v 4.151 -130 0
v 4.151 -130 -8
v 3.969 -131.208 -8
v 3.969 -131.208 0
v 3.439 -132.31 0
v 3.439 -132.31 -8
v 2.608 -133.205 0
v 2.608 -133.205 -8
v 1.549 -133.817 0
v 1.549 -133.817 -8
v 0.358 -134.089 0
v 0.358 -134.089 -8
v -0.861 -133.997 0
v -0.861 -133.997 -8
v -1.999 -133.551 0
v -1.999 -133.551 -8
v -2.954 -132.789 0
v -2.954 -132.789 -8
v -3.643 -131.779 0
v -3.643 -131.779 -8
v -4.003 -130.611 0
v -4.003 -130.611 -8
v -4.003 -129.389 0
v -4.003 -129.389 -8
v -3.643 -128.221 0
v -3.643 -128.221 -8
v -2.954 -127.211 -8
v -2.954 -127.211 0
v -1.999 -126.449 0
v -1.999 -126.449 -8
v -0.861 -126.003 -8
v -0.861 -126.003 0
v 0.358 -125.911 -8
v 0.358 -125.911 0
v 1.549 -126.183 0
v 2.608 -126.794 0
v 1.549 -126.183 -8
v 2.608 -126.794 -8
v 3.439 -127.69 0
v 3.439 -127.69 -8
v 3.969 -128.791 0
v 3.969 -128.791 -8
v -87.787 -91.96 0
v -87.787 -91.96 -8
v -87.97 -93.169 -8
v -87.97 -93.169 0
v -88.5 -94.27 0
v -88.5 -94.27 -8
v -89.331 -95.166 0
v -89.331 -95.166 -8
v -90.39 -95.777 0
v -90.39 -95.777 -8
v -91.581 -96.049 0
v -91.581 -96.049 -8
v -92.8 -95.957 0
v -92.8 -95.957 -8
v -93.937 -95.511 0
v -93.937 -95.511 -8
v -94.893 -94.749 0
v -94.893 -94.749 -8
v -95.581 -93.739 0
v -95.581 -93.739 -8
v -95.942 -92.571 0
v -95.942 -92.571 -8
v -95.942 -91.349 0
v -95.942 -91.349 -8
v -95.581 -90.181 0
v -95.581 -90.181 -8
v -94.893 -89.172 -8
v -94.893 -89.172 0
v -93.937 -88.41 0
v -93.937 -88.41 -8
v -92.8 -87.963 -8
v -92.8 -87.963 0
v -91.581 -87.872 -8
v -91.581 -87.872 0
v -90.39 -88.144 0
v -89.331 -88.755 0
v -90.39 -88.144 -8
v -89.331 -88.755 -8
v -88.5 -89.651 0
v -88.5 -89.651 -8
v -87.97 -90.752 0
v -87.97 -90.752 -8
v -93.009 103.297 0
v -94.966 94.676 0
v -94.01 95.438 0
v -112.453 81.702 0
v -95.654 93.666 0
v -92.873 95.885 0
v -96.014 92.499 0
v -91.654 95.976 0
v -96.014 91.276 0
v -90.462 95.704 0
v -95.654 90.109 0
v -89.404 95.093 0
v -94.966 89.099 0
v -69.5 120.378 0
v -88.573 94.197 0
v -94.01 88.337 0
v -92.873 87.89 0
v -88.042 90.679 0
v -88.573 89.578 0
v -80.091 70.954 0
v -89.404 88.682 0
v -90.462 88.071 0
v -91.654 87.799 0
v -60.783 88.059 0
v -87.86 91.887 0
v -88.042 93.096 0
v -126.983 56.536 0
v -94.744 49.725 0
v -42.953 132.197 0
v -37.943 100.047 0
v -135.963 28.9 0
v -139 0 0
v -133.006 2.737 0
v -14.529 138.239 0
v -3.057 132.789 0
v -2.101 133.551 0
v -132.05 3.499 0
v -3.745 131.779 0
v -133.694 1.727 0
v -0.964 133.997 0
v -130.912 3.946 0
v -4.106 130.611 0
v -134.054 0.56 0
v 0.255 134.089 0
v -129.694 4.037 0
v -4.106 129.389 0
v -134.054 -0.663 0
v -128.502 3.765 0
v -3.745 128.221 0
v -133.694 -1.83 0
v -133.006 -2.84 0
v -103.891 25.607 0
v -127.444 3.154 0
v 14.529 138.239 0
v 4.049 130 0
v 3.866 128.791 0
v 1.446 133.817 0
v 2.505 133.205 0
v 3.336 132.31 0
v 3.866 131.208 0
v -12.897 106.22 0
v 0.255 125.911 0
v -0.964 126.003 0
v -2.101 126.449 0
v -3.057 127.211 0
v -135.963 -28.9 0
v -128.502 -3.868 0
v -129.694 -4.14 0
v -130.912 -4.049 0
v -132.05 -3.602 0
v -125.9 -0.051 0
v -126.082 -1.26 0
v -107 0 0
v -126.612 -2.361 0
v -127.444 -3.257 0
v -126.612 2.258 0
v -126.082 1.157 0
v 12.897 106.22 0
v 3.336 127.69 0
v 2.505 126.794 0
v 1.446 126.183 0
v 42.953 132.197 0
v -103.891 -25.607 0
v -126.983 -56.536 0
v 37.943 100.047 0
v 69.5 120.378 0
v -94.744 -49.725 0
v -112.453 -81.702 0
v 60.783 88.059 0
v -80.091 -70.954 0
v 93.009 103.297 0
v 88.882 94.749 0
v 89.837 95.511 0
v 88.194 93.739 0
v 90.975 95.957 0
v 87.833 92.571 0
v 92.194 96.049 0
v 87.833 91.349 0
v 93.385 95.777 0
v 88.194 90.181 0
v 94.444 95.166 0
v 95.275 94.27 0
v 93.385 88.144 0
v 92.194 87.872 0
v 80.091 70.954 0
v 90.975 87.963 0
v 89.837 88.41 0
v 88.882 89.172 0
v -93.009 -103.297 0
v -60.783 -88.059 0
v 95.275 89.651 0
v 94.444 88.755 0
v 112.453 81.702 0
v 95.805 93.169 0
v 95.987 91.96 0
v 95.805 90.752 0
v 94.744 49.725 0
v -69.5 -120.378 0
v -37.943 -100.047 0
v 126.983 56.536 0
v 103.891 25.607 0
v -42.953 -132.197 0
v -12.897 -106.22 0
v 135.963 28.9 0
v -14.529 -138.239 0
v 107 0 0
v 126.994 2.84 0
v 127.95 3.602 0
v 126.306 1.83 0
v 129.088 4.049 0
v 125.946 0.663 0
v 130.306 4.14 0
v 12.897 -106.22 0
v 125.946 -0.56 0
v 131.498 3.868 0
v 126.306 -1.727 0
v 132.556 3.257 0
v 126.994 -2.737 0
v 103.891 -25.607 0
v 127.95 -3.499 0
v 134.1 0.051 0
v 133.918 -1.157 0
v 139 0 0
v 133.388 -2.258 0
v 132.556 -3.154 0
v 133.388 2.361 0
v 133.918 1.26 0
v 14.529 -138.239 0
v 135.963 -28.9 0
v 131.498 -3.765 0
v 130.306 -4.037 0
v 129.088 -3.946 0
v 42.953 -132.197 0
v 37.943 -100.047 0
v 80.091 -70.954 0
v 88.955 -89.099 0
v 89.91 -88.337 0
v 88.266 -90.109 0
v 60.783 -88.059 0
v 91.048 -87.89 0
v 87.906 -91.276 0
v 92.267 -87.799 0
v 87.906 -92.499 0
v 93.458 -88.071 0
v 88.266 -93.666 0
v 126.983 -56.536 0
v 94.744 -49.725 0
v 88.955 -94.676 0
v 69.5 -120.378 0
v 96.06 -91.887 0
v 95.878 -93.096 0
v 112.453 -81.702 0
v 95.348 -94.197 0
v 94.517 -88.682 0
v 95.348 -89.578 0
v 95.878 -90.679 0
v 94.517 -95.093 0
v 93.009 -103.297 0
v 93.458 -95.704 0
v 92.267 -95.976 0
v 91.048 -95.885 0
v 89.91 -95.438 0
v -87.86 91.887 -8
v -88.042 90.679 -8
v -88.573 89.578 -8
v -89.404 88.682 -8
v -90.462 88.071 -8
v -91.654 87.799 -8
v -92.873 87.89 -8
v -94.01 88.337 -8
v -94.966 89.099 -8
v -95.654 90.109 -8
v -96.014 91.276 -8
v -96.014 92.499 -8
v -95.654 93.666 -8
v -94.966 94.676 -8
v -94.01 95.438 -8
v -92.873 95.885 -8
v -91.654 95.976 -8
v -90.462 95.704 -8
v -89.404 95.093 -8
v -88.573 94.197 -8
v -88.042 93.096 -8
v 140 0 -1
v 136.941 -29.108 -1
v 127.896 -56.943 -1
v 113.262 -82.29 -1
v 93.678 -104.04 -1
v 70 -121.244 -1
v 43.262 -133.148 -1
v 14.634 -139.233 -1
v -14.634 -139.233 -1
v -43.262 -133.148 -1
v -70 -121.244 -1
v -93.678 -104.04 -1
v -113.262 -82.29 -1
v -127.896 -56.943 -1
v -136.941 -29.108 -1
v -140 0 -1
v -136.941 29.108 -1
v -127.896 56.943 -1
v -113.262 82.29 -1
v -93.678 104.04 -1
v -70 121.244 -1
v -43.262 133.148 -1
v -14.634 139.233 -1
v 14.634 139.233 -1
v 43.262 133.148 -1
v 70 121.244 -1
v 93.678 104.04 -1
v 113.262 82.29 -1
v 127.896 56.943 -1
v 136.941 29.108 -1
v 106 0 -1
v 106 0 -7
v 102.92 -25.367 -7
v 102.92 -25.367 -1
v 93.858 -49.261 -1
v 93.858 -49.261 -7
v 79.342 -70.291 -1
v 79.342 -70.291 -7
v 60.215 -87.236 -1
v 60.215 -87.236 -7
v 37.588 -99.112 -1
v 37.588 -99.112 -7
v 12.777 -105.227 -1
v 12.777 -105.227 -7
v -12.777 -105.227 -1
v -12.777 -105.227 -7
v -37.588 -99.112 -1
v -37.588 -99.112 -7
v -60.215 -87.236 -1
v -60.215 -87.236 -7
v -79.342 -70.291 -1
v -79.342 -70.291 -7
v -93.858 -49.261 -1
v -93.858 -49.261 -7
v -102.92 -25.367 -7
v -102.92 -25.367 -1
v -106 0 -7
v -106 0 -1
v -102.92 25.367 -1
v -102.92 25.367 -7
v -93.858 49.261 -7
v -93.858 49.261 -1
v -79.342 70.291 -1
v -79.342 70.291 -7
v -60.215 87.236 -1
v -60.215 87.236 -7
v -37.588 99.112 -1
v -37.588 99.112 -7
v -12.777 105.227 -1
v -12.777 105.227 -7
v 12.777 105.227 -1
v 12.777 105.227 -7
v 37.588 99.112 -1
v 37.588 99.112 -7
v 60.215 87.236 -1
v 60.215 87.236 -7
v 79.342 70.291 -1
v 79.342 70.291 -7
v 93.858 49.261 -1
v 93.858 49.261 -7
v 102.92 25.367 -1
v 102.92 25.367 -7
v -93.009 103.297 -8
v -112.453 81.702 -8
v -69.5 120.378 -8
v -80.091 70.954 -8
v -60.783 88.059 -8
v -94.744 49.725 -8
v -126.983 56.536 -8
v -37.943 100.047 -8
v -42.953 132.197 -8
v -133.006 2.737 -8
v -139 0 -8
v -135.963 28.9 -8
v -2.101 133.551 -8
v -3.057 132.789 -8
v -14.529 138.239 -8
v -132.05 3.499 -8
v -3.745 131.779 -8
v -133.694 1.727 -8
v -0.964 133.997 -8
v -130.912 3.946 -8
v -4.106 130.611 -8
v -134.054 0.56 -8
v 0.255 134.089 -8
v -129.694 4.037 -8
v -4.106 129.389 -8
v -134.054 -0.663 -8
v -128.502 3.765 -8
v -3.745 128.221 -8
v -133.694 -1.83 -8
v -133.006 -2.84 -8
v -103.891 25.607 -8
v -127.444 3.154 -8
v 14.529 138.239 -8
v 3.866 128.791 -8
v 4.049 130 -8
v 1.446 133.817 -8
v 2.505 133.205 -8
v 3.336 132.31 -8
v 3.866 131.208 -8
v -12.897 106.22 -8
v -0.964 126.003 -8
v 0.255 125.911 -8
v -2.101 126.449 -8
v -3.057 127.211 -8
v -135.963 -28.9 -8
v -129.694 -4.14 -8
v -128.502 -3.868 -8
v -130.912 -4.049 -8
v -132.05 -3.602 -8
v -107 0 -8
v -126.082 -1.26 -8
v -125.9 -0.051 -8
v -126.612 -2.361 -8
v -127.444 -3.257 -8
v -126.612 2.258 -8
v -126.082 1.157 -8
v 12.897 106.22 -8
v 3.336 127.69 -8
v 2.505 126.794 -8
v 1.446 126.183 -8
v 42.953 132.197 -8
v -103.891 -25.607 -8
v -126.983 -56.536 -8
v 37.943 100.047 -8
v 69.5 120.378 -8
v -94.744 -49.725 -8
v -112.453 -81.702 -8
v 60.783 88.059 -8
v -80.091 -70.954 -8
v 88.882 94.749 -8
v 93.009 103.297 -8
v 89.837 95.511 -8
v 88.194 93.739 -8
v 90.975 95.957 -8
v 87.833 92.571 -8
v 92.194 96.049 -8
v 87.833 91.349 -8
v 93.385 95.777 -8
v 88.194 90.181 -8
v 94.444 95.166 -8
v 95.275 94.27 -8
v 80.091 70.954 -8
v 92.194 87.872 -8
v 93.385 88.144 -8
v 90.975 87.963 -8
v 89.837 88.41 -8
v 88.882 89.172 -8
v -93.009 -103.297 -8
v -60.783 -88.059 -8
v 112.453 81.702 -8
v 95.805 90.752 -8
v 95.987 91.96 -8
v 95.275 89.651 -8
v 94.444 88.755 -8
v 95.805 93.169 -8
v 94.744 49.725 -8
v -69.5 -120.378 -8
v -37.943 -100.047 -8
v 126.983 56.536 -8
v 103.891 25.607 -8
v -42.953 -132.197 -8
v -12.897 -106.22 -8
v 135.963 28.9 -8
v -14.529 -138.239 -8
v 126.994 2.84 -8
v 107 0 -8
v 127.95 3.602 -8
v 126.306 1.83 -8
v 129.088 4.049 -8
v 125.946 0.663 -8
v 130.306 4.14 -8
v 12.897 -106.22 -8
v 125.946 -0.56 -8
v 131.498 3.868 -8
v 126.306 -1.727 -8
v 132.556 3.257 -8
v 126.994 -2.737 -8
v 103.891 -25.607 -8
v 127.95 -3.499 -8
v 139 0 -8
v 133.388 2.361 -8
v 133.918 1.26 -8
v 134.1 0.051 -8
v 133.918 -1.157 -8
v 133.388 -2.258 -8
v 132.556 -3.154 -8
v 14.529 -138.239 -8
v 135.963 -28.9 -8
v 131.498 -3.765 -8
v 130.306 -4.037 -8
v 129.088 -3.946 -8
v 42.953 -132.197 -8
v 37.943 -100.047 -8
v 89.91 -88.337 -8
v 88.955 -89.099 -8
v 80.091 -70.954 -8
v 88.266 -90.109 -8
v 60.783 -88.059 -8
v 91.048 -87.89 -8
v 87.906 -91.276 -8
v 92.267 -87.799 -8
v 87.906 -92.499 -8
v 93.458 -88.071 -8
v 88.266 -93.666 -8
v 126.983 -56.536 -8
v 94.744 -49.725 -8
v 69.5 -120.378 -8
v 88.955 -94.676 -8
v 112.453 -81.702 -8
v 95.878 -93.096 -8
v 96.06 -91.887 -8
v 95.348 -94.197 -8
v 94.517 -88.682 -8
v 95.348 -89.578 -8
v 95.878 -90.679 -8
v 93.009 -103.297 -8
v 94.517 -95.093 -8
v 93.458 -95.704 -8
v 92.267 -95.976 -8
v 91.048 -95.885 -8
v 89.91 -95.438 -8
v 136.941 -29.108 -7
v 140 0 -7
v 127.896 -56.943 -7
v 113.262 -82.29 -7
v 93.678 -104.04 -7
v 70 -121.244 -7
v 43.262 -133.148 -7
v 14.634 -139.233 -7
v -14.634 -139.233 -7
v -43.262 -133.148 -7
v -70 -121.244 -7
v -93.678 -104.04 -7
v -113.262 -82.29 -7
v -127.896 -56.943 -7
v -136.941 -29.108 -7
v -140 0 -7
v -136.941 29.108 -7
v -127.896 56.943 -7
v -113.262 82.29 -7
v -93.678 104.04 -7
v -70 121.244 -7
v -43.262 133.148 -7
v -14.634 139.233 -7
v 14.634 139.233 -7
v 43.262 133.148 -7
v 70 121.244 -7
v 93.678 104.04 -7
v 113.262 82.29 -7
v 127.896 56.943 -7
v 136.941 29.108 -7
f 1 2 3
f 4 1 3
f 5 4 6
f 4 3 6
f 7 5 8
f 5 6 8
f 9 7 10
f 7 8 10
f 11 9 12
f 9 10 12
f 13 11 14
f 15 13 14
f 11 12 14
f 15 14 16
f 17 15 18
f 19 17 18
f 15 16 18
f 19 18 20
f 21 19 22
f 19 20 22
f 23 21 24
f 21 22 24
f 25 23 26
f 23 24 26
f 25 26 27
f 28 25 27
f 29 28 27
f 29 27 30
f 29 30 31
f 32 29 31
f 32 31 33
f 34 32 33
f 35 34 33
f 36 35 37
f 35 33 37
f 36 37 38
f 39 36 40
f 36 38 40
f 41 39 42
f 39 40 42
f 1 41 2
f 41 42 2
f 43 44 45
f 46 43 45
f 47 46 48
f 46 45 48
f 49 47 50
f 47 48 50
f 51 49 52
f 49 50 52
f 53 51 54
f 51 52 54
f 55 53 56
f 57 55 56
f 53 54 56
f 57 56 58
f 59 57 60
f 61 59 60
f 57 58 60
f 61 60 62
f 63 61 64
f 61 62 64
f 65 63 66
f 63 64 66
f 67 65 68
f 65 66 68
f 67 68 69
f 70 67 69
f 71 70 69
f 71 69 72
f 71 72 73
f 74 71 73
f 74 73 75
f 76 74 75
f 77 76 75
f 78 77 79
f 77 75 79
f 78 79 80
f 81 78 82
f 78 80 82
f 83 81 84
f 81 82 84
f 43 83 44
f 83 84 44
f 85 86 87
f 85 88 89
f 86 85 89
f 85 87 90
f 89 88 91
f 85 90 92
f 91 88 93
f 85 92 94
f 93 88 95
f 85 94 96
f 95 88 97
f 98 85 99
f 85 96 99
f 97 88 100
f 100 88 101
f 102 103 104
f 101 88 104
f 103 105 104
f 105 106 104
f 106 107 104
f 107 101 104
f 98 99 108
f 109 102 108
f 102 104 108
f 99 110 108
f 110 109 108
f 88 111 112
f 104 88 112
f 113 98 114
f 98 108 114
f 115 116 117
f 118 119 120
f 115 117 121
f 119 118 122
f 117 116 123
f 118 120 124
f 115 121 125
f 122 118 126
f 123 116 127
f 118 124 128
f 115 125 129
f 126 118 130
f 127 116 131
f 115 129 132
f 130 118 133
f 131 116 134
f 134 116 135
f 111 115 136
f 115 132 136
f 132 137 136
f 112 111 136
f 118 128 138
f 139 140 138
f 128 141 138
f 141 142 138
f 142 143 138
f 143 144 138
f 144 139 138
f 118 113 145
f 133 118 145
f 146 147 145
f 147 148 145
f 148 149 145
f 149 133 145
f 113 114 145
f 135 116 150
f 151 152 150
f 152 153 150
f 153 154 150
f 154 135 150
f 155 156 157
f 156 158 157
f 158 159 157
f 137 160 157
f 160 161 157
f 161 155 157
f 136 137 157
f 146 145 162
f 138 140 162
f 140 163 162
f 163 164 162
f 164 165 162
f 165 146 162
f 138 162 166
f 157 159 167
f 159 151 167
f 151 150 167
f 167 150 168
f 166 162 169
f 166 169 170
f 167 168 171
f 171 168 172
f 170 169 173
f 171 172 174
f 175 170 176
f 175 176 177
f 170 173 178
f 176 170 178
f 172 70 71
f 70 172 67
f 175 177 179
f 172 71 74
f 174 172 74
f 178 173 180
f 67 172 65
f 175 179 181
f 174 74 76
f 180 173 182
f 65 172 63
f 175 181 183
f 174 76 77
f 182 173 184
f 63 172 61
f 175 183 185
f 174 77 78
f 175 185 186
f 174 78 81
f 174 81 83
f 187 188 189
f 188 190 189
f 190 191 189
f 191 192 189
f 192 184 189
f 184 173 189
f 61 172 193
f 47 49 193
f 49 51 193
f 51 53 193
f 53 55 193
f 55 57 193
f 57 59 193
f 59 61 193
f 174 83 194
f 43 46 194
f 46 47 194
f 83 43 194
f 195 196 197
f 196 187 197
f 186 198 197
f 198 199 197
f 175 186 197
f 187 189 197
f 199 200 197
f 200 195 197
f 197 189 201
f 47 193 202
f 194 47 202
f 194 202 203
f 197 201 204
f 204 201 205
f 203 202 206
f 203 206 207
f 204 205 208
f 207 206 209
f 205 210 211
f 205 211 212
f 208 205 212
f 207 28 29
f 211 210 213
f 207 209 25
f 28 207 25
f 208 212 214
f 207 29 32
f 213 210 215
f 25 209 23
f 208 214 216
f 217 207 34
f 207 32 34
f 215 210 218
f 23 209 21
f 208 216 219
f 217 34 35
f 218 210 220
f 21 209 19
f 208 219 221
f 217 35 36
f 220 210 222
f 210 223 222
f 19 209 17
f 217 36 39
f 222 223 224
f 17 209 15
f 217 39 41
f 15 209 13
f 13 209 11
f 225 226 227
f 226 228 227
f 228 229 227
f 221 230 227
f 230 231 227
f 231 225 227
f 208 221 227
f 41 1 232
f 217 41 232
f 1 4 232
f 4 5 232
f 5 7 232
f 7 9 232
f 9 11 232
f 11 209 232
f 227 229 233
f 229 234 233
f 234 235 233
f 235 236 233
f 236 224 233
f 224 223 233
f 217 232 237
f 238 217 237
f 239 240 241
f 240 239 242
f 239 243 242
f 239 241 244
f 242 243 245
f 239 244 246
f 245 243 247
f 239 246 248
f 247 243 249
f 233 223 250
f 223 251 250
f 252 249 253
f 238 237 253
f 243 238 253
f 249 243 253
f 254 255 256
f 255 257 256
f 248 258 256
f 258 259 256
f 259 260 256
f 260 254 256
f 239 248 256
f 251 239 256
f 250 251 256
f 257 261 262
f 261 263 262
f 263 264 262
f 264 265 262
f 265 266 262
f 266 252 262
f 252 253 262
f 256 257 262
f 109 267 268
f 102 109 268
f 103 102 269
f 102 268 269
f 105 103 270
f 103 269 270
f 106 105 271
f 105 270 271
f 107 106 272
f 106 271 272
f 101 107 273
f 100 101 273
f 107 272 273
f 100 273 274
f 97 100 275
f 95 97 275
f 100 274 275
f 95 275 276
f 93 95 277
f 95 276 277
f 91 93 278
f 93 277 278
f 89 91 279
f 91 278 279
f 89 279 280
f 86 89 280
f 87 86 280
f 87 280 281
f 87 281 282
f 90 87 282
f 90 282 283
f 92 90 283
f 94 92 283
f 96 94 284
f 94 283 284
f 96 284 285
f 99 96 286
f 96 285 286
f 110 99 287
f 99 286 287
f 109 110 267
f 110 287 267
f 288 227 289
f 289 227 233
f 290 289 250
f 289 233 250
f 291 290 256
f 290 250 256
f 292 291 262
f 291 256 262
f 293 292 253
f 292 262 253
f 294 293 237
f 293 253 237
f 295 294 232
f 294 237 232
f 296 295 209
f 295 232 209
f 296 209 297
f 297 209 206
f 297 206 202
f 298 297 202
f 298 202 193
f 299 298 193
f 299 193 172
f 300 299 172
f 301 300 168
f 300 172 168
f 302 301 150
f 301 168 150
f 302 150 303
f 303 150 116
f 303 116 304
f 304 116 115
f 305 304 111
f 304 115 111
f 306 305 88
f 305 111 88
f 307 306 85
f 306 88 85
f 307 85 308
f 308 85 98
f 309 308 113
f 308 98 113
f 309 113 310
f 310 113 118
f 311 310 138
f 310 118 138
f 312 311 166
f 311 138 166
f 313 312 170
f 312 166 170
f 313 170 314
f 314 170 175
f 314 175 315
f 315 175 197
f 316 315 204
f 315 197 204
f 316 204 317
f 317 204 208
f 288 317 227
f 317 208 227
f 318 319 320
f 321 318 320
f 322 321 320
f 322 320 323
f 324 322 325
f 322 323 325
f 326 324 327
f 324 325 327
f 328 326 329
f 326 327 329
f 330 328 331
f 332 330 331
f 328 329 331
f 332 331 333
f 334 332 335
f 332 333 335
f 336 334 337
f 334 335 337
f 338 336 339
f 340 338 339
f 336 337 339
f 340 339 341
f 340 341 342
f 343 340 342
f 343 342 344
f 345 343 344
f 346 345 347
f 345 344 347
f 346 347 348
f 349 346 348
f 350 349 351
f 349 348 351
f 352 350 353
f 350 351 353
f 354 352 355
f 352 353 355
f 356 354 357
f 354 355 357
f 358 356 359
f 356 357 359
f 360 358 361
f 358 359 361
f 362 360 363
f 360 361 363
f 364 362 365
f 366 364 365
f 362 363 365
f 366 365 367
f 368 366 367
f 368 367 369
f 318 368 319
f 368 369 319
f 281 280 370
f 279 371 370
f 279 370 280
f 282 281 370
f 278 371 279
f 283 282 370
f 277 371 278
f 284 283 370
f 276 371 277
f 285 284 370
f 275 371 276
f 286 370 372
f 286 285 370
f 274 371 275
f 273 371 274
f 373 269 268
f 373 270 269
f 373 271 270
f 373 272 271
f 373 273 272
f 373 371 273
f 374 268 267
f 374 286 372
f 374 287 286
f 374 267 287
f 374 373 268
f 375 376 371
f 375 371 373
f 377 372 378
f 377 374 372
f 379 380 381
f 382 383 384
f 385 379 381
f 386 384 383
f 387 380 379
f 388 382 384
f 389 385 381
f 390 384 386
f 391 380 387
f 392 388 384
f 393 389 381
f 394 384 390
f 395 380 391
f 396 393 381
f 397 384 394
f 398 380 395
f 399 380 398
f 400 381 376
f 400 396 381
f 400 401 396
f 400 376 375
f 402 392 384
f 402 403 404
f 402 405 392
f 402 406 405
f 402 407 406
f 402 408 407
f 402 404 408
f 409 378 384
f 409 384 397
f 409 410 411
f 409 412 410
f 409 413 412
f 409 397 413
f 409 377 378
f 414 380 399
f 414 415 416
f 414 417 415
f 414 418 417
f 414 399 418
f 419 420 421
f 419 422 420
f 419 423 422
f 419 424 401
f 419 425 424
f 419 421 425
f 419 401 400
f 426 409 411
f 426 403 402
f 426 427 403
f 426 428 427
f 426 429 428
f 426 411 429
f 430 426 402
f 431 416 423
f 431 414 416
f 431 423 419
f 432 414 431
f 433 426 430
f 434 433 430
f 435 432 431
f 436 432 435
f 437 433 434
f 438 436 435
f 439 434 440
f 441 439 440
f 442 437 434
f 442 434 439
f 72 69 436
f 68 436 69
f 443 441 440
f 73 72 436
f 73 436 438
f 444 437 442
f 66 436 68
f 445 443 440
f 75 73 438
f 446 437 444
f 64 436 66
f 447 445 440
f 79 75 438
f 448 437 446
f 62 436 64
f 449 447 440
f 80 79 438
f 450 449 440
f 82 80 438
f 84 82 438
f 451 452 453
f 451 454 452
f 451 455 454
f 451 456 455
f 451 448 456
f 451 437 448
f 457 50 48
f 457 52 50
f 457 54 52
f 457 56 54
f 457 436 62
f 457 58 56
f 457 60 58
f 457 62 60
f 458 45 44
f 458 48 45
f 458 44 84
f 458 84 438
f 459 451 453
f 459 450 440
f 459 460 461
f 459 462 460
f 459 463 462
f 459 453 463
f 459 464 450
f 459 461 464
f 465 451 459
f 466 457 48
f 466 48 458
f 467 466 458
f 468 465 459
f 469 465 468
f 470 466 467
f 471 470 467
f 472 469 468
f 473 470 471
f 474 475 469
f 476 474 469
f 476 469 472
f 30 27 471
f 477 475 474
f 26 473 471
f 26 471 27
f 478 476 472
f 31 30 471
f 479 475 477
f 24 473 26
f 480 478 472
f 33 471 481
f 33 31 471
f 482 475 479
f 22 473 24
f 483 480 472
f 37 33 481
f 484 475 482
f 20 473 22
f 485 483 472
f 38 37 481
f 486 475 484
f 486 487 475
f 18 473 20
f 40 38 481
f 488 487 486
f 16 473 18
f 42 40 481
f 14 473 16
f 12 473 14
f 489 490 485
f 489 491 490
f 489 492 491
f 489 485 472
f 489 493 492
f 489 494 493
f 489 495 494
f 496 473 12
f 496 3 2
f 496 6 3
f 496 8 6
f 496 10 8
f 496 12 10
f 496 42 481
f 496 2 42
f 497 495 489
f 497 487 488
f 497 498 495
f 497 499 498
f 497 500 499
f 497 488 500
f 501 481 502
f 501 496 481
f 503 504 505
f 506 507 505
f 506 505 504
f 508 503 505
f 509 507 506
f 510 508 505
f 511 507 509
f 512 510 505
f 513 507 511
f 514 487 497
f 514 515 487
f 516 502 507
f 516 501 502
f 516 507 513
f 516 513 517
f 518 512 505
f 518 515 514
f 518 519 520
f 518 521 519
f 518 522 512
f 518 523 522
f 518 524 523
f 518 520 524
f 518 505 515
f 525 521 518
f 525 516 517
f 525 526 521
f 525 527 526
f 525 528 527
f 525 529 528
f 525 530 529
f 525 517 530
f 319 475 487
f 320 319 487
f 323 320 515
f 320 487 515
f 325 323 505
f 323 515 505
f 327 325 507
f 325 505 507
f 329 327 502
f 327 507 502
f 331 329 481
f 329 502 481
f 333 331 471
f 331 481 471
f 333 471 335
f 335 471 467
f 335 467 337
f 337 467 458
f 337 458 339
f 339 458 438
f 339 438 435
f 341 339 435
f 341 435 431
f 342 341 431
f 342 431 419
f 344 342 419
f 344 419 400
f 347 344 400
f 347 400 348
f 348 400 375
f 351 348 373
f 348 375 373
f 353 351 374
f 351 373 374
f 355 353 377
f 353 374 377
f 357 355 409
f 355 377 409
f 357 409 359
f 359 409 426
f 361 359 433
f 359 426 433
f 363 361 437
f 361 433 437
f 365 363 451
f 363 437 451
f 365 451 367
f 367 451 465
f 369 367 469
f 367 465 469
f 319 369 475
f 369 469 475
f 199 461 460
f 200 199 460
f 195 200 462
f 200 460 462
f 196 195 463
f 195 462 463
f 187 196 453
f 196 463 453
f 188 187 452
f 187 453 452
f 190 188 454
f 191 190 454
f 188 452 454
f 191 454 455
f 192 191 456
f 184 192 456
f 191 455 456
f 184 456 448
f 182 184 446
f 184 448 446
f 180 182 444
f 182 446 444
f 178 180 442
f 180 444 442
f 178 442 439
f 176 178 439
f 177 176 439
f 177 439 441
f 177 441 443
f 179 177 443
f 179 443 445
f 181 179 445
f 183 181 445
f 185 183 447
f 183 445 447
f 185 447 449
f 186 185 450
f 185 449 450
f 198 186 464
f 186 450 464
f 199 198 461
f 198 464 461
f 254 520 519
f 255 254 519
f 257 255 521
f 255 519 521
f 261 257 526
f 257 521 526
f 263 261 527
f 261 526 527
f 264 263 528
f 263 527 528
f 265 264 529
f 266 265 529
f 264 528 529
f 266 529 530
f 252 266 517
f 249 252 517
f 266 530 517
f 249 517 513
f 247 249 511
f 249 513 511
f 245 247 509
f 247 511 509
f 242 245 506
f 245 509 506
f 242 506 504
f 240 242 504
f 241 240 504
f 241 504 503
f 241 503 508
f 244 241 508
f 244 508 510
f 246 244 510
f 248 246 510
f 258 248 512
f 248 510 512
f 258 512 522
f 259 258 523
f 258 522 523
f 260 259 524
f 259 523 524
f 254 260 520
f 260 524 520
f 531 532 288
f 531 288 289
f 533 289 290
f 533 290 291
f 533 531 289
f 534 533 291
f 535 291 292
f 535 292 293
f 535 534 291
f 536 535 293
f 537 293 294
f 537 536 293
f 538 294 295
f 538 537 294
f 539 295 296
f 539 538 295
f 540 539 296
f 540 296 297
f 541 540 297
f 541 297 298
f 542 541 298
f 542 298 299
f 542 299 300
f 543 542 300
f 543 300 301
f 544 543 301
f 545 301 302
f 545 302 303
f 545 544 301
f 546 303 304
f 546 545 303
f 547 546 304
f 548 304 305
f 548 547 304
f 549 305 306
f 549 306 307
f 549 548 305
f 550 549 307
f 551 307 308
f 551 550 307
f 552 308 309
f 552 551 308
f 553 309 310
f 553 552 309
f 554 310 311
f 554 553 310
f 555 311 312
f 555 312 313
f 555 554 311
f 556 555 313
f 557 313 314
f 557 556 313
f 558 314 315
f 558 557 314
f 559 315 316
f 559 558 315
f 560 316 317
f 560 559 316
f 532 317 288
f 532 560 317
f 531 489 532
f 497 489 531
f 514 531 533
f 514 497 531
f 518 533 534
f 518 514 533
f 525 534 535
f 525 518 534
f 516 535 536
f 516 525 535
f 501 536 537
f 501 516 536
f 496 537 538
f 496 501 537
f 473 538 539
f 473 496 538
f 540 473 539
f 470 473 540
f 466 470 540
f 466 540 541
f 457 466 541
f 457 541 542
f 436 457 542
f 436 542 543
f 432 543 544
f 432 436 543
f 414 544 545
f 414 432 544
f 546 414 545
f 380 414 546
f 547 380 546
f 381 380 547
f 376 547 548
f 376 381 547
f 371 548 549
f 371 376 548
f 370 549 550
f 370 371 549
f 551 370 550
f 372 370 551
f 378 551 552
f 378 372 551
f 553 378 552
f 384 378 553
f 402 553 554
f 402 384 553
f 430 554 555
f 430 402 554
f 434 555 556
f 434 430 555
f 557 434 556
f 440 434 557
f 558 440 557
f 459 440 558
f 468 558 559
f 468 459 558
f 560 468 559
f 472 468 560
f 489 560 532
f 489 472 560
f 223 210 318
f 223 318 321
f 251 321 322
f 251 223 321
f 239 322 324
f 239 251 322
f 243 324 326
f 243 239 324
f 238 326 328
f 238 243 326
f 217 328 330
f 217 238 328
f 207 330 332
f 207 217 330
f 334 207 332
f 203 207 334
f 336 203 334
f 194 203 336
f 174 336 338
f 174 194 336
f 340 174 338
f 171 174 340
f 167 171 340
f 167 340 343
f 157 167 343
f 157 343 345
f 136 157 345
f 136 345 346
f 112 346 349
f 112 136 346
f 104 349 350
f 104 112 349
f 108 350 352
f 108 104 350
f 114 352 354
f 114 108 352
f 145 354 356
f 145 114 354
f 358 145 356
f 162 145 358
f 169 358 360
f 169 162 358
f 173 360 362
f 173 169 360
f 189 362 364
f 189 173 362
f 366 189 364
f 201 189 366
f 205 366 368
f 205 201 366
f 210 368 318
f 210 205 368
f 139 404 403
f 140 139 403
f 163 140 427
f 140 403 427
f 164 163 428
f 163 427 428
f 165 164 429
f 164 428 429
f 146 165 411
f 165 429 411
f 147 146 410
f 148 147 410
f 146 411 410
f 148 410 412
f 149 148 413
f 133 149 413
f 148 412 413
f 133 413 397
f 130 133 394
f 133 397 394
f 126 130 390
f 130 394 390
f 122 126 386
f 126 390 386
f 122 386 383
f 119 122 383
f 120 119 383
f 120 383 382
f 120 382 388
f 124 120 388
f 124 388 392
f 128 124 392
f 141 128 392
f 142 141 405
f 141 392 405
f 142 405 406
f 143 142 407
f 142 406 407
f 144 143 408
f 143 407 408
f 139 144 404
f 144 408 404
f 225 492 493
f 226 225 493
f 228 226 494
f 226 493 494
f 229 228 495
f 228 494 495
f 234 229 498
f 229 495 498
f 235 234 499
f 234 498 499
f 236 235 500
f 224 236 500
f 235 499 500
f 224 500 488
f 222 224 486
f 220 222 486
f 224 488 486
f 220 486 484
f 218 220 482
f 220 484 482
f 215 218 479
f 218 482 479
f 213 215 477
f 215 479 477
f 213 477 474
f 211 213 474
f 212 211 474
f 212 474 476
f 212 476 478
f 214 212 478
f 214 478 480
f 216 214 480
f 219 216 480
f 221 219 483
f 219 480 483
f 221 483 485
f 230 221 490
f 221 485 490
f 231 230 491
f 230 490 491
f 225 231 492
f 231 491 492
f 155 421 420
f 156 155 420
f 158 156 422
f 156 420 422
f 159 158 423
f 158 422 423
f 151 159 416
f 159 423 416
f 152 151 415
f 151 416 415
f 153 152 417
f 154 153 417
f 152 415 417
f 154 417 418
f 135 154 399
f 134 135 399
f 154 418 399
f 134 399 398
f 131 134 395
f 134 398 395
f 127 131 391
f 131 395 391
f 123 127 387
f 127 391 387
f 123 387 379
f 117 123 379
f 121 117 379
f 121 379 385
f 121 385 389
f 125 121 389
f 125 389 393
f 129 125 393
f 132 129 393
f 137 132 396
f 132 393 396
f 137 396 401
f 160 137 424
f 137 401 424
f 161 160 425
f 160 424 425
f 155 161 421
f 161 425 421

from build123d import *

# Parameters (mm, degrees)
SKETCH1_R           = 140
SKETCH1_R_2         = 4.1
SKETCH1_R_3         = 106
BOSS_EXTRUDE1_DEPTH = 8
CHAMFER2_SIZE       = 1


with BuildPart() as part:
    # Sketch1 → Boss-Extrude1 (new body)
    with BuildSketch(Plane(origin=(0, 0, -8), x_dir=(-1, 0, 0), z_dir=(0, 0, -1))):
        with Locations(Location((0, 0, 0), (0, 0, 180))):
            Circle(SKETCH1_R)
        with Locations(Location((91.960251276, 91.887497437, 0), (0, 0, 180))):
            Circle(SKETCH1_R_2, mode=Mode.SUBTRACT)
        with Locations(Location((129.999989821, -0.051444733, 0), (0, 0, 180))):
            Circle(SKETCH1_R_2, mode=Mode.SUBTRACT)
        with Locations(Location((91.887497437, -91.960251276, 0), (0, 0, 180))):
            Circle(SKETCH1_R_2, mode=Mode.SUBTRACT)
        with Locations(Location((-0.051444733, -129.999989821, 0), (0, 0, 180))):
            Circle(SKETCH1_R_2, mode=Mode.SUBTRACT)
        with Locations(Location((-91.960251276, -91.887497437, 0), (0, 0, 180))):
            Circle(SKETCH1_R_2, mode=Mode.SUBTRACT)
        with Locations(Location((-129.999989821, 0.051444733, 0), (0, 0, 180))):
            Circle(SKETCH1_R_2, mode=Mode.SUBTRACT)
        with Locations(Location((-91.887497437, 91.960251276, 0), (0, 0, 180))):
            Circle(SKETCH1_R_2, mode=Mode.SUBTRACT)
        with Locations(Location((0.051444733, 129.999989821, 0), (0, 0, 180))):
            Circle(SKETCH1_R_2, mode=Mode.SUBTRACT)
        with Locations(Location((0, 0, 0), (0, 0, 180))):
            Circle(SKETCH1_R_3, mode=Mode.SUBTRACT)
    extrude(amount=-BOSS_EXTRUDE1_DEPTH)

    # Chamfer2
    chamfer2_edges = [part.edges().sort_by_distance(p)[0] for p in [
        (-140, 0, -8),
        (-106, 0, 0),
        (-106, 0, -8),
        (-140, 0, 0),
    ]]
    chamfer(chamfer2_edges, length=CHAMFER2_SIZE)


solid = part.part
